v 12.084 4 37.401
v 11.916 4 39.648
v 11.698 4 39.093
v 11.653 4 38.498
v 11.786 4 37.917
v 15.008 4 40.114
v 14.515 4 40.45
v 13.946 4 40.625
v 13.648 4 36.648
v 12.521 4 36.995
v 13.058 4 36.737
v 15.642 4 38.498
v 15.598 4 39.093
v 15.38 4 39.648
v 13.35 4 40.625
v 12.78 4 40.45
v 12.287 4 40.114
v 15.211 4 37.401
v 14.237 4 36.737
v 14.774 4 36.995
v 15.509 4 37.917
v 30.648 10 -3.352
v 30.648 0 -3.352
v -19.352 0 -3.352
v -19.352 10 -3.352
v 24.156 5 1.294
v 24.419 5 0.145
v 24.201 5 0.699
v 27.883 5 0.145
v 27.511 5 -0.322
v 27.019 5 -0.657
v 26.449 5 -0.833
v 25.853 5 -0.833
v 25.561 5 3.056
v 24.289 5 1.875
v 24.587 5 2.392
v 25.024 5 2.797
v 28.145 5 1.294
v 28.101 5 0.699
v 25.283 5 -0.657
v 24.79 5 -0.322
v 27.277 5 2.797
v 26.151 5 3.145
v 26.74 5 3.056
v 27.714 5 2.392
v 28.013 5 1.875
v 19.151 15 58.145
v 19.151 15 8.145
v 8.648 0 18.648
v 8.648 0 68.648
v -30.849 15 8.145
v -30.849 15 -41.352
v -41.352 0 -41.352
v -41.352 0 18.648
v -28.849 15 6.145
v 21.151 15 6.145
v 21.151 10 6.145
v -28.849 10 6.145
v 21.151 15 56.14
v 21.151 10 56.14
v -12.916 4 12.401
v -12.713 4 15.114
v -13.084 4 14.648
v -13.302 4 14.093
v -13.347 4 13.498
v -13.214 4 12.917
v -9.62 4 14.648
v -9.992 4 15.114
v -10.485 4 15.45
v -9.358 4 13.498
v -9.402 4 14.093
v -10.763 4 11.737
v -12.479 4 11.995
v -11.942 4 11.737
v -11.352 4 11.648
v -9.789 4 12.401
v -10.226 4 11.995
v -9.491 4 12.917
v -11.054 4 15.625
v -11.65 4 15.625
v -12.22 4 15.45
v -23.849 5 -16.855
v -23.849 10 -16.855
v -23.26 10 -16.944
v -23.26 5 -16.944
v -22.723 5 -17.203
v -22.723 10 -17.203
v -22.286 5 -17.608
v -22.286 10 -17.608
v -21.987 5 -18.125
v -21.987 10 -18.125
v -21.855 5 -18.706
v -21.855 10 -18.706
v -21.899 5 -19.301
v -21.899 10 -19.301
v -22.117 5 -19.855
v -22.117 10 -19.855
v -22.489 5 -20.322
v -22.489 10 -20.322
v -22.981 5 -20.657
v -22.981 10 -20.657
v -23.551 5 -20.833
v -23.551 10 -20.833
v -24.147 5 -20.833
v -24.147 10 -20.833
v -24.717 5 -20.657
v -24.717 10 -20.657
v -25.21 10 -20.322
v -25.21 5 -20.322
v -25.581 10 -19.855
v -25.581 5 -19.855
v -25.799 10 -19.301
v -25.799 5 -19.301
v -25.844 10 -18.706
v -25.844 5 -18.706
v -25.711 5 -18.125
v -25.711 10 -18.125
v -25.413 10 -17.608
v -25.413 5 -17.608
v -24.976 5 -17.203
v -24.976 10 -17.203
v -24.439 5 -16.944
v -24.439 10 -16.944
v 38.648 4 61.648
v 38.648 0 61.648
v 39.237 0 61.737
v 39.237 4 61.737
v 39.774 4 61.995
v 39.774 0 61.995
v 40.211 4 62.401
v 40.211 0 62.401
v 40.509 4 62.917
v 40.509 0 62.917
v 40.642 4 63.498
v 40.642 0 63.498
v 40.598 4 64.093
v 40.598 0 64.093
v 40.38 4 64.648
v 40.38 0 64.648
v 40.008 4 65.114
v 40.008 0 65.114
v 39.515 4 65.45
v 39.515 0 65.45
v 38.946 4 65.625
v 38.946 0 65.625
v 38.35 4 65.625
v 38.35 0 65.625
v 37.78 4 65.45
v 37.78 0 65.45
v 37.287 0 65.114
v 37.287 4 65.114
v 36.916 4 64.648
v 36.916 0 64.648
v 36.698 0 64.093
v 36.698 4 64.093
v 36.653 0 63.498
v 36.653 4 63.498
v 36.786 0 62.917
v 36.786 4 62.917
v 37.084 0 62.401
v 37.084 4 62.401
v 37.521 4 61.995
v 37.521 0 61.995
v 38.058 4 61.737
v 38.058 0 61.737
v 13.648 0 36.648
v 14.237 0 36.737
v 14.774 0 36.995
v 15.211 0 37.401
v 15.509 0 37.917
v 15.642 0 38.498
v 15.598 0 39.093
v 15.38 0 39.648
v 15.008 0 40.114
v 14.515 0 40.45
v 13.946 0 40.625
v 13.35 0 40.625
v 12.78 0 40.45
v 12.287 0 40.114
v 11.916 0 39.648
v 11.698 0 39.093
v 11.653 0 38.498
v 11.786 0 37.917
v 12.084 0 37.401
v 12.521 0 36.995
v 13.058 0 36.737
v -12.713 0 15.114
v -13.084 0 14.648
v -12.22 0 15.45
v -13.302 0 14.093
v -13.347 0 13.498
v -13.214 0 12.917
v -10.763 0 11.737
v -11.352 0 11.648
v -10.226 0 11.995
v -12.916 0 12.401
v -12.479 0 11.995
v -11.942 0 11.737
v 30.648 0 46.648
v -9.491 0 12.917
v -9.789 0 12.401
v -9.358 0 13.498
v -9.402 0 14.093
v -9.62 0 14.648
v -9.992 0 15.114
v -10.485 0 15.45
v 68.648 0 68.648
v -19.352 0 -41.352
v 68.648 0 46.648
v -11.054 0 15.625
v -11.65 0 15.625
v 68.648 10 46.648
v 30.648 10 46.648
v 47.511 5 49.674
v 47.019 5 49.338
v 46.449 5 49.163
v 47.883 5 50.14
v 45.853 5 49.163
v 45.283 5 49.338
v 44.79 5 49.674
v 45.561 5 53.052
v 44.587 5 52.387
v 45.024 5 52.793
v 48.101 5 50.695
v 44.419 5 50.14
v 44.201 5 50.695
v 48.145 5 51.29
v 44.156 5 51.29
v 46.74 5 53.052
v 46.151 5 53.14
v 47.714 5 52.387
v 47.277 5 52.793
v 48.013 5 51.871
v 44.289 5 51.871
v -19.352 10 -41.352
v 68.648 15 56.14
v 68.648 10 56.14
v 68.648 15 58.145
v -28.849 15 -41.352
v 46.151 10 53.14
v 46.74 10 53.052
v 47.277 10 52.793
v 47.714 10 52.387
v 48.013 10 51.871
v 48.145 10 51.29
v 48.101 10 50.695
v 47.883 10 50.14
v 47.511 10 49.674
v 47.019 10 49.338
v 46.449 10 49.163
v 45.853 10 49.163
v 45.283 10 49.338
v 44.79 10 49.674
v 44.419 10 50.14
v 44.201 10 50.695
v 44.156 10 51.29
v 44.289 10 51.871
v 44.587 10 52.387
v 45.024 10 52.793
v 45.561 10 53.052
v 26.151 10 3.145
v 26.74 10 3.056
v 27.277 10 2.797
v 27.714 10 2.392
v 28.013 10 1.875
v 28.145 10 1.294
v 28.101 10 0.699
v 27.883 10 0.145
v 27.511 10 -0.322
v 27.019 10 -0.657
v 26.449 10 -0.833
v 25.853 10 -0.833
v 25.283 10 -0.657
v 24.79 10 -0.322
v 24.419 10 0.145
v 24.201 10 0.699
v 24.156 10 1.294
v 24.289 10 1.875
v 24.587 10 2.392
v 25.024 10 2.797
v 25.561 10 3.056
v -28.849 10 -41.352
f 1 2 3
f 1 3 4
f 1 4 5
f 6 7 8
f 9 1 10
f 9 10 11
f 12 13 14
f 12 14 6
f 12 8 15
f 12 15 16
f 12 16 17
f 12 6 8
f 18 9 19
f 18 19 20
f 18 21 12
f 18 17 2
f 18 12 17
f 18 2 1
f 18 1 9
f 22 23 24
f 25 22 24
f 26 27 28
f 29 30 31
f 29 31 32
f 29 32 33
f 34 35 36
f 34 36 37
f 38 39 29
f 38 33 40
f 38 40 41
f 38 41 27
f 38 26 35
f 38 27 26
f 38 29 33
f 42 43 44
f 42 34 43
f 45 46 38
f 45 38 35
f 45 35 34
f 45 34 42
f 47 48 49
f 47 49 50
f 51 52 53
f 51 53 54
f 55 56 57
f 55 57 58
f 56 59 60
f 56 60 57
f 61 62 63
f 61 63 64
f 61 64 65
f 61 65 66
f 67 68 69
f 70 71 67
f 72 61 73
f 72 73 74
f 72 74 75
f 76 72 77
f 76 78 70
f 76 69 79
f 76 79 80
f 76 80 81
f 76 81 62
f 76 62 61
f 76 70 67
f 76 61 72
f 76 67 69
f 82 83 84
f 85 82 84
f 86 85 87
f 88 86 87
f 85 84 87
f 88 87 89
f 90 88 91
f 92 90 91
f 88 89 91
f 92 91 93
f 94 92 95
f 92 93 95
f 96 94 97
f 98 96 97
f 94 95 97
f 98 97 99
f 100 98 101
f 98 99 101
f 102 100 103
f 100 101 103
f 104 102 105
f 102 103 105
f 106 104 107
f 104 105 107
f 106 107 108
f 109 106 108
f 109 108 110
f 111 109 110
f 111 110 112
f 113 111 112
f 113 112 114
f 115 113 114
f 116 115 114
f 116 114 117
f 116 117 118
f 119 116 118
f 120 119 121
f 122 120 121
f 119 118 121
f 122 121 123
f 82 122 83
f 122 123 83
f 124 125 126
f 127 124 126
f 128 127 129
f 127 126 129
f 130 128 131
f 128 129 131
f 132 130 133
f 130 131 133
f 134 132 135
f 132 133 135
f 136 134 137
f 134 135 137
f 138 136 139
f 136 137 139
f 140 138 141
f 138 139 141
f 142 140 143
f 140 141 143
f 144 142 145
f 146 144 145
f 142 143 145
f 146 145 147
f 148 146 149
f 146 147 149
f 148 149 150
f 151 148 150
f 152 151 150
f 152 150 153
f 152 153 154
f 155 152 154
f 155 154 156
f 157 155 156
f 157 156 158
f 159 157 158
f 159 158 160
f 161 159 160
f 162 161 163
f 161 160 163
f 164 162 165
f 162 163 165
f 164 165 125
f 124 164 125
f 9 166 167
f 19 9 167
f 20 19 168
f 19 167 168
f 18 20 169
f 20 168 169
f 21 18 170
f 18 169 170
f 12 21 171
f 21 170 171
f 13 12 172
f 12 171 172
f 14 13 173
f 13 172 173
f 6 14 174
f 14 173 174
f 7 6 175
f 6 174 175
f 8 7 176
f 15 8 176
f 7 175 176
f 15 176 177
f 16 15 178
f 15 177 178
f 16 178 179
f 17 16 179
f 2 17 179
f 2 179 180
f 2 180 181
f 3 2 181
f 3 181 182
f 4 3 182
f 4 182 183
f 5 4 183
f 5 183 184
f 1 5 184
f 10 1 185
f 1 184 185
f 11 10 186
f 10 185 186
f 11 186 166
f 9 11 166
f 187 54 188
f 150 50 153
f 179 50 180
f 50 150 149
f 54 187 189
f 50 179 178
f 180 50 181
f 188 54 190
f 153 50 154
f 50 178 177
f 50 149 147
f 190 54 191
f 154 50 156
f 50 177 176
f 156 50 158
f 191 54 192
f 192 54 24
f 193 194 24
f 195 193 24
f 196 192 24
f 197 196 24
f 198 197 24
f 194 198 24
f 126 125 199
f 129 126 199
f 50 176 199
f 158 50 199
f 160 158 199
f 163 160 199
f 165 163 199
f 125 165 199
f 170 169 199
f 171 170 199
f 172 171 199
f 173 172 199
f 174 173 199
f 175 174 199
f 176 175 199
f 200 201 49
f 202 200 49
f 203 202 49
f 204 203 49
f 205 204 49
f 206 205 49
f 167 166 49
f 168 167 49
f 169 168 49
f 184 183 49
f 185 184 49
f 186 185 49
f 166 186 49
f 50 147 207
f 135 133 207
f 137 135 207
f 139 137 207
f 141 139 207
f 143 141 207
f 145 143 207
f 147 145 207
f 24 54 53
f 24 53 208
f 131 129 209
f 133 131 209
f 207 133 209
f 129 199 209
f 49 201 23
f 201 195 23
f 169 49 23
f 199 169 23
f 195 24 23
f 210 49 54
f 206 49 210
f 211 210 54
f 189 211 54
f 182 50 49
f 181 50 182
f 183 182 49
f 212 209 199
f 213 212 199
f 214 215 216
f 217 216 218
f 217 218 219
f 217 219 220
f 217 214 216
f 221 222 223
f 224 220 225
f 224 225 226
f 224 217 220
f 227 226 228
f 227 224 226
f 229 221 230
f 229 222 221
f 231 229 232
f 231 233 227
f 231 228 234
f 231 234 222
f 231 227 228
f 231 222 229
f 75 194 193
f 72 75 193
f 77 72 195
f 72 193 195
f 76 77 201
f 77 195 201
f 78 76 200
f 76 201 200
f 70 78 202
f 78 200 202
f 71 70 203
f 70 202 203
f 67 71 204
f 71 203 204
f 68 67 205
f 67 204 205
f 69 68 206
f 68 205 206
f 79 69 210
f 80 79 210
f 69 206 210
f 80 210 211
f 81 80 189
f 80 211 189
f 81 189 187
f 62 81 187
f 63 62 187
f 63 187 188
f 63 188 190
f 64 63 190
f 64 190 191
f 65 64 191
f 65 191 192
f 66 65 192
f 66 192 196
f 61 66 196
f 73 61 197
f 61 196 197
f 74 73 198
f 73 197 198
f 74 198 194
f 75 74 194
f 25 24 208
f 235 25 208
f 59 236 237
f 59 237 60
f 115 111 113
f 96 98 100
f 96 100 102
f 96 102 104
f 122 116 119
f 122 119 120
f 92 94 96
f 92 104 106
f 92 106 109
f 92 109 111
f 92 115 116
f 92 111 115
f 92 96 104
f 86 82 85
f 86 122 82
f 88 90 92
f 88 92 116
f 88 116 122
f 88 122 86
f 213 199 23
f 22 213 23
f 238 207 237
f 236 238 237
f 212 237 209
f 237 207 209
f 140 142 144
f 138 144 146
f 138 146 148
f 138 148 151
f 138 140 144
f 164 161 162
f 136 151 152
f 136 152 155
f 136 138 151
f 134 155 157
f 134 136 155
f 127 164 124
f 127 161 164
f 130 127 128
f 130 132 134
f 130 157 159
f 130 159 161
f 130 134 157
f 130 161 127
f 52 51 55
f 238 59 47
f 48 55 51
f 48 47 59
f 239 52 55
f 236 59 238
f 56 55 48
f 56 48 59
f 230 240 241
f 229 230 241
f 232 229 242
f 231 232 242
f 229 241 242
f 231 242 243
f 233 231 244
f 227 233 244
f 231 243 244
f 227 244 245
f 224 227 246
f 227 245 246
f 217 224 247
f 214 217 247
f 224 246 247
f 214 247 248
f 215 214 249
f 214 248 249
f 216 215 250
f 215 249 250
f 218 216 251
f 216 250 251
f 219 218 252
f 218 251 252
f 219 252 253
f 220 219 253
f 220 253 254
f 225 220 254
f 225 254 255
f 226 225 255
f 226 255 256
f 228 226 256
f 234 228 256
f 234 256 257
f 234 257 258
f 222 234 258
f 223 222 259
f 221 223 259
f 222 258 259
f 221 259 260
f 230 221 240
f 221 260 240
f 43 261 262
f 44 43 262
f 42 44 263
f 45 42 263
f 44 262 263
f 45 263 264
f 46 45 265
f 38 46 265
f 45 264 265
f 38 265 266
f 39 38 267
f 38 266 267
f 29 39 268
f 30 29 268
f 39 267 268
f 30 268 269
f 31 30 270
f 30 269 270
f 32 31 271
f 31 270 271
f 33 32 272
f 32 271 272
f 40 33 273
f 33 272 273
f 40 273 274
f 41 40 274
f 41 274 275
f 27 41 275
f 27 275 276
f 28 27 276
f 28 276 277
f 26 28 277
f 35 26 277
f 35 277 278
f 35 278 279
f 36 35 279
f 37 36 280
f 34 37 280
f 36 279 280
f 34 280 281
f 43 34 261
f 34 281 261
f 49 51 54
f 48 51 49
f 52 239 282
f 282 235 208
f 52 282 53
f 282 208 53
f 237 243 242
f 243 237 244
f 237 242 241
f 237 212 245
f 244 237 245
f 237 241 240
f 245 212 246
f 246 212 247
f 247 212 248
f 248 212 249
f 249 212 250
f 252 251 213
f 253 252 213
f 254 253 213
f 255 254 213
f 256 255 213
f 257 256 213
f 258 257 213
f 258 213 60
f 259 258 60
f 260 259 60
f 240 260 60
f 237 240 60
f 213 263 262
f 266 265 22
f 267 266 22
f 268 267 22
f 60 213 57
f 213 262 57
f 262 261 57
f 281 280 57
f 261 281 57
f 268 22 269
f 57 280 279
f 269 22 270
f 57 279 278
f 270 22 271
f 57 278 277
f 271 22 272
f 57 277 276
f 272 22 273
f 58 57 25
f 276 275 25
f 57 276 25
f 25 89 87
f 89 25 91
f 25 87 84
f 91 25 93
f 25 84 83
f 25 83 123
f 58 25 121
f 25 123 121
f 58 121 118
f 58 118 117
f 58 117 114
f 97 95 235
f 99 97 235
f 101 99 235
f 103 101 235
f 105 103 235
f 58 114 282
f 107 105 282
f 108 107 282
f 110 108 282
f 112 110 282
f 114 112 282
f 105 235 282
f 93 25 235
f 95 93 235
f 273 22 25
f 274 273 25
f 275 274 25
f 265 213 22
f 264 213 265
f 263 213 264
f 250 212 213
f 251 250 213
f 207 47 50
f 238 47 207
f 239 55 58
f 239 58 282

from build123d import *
from OCP.BRepFilletAPI import BRepFilletAPI_MakeChamfer

# Parameters (mm, degrees)
BOSS_EXTRU_1_DEPTH      = 15
CHANFREIN1_SIZE         = 15
CHANFREIN1_SIZE_2       = 10.503113073
ESQUISSE4_R             = 2
ENL_V_MAT_EXTRU_3_DEPTH = 4
ENL_V_MAT_EXTRU_5_DEPTH = 5
ESQUISSE6_R             = 2
ENL_V_MAT_EXTRU_6_DEPTH = 5


with BuildPart() as part:
    # Esquisse1 → Boss.-Extru.1 (new body)
    with BuildSketch(Plane(origin=(0, 0, 0), x_dir=(1, 0, 0), z_dir=(0, 1, 0))):
        Polygon((-41.352348911, -18.647651089), (8.647651089, -18.647651089), (8.647651089, -68.647651089), (68.647651089, -68.647651089), (68.647651089, -46.647651089), (30.647651089, -46.647651089), (30.647651089, 3.352348911), (-19.352348911, 3.352348911), (-19.352348911, 41.352348911), (-41.352348911, 41.352348911), align=None)
    extrude(amount=BOSS_EXTRU_1_DEPTH)

    # Chanfrein1
    chanfrein1_edges_1 = [part.edges().sort_by_distance(p)[0] for p in [
        (38.647651089, 15, 68.647651089),
    ]]
    chanfrein1_side_1 = [part.faces().sort_by_distance(p)[0] for p in [
        (38.647651089, 14.789937739, 68.647651089),
    ]]
    chanfrein1_edges_2 = [part.edges().sort_by_distance(p)[0] for p in [
        (8.647651089, 15, 43.647651089),
    ]]
    chanfrein1_side_2 = [part.faces().sort_by_distance(p)[0] for p in [
        (8.647651089, 14.789937739, 43.647651089),
    ]]
    chanfrein1_edges_3 = [part.edges().sort_by_distance(p)[0] for p in [
        (-16.352348911, 15, 18.647651089),
    ]]
    chanfrein1_side_3 = [part.faces().sort_by_distance(p)[0] for p in [
        (-16.352348911, 14.789937739, 18.647651089),
    ]]
    chanfrein1_edges_4 = [part.edges().sort_by_distance(p)[0] for p in [
        (-41.352348911, 15, -11.352348911),
    ]]
    chanfrein1_side_4 = [part.faces().sort_by_distance(p)[0] for p in [
        (-41.352348911, 14.789937739, -11.352348911),
    ]]
    chanfrein1 = BRepFilletAPI_MakeChamfer(part.part.solid().wrapped)
    for e in chanfrein1_edges_1:
        chanfrein1.Add(CHANFREIN1_SIZE - 0.0001, CHANFREIN1_SIZE_2 - 0.0001, e.wrapped, chanfrein1_side_1[0].wrapped)
    for e in chanfrein1_edges_2:
        chanfrein1.Add(CHANFREIN1_SIZE - 0.0001, CHANFREIN1_SIZE_2 - 0.0001, e.wrapped, chanfrein1_side_2[0].wrapped)
    for e in chanfrein1_edges_3:
        chanfrein1.Add(CHANFREIN1_SIZE - 0.0001, CHANFREIN1_SIZE_2 - 0.0001, e.wrapped, chanfrein1_side_3[0].wrapped)
    for e in chanfrein1_edges_4:
        chanfrein1.Add(CHANFREIN1_SIZE - 0.0001, CHANFREIN1_SIZE_2 - 0.0001, e.wrapped, chanfrein1_side_4[0].wrapped)
    add(Compound.cast(chanfrein1.Shape()), mode=Mode.REPLACE)  # a hair under: the kernel refuses the full size

    # Esquisse4 → Enlèv. mat.-Extru.3 (cut)
    with BuildSketch(Plane.XZ):
        with Locations(Location((38.647651089, 63.647651089, 0), (0, 0, 270))):
            Circle(ESQUISSE4_R)
        with Locations(Location((13.647651089, 38.647651089, 0), (0, 0, 270))):
            Circle(ESQUISSE4_R)
        with Locations(Location((-11.352348911, 13.647651089, 0), (0, 0, 270))):
            Circle(ESQUISSE4_R)
    extrude(amount=-ENL_V_MAT_EXTRU_3_DEPTH, mode=Mode.SUBTRACT)

    # Esquisse5 → Enlèv. mat.-Extru.5 (cut)
    with BuildSketch(Plane(origin=(0, 15, 0), x_dir=(1, 0, 0), z_dir=(0, 1, 0))):
        Polygon((-28.849235838, 41.352348911), (-19.352348911, 41.352348911), (-19.352348911, 3.352348911), (30.647651089, 3.352348911), (30.647651089, -46.647651089), (68.647651089, -46.647651089), (68.647651089, -56.140382231), (21.150764162, -56.140382231), (21.150764162, -6.144538016), (-28.849235838, -6.144538016), align=None)
    extrude(amount=-ENL_V_MAT_EXTRU_5_DEPTH, mode=Mode.SUBTRACT)

    # Esquisse6 → Enlèv. mat.-Extru.6 (cut)
    with BuildSketch(Plane(origin=(0, 10, 0), x_dir=(1, 0, 0), z_dir=(0, 1, 0))):
        with Locations(Location((-23.849235838, 18.855461984, 0), (0, 0, 270))):
            Circle(ESQUISSE6_R)
        with Locations(Location((26.150764162, -1.144538016, 0), (0, 0, 270))):
            Circle(ESQUISSE6_R)
        with Locations(Location((46.150764162, -51.140382231, 0), (0, 0, 270))):
            Circle(ESQUISSE6_R)
    extrude(amount=-ENL_V_MAT_EXTRU_6_DEPTH, mode=Mode.SUBTRACT)


solid = part.part
